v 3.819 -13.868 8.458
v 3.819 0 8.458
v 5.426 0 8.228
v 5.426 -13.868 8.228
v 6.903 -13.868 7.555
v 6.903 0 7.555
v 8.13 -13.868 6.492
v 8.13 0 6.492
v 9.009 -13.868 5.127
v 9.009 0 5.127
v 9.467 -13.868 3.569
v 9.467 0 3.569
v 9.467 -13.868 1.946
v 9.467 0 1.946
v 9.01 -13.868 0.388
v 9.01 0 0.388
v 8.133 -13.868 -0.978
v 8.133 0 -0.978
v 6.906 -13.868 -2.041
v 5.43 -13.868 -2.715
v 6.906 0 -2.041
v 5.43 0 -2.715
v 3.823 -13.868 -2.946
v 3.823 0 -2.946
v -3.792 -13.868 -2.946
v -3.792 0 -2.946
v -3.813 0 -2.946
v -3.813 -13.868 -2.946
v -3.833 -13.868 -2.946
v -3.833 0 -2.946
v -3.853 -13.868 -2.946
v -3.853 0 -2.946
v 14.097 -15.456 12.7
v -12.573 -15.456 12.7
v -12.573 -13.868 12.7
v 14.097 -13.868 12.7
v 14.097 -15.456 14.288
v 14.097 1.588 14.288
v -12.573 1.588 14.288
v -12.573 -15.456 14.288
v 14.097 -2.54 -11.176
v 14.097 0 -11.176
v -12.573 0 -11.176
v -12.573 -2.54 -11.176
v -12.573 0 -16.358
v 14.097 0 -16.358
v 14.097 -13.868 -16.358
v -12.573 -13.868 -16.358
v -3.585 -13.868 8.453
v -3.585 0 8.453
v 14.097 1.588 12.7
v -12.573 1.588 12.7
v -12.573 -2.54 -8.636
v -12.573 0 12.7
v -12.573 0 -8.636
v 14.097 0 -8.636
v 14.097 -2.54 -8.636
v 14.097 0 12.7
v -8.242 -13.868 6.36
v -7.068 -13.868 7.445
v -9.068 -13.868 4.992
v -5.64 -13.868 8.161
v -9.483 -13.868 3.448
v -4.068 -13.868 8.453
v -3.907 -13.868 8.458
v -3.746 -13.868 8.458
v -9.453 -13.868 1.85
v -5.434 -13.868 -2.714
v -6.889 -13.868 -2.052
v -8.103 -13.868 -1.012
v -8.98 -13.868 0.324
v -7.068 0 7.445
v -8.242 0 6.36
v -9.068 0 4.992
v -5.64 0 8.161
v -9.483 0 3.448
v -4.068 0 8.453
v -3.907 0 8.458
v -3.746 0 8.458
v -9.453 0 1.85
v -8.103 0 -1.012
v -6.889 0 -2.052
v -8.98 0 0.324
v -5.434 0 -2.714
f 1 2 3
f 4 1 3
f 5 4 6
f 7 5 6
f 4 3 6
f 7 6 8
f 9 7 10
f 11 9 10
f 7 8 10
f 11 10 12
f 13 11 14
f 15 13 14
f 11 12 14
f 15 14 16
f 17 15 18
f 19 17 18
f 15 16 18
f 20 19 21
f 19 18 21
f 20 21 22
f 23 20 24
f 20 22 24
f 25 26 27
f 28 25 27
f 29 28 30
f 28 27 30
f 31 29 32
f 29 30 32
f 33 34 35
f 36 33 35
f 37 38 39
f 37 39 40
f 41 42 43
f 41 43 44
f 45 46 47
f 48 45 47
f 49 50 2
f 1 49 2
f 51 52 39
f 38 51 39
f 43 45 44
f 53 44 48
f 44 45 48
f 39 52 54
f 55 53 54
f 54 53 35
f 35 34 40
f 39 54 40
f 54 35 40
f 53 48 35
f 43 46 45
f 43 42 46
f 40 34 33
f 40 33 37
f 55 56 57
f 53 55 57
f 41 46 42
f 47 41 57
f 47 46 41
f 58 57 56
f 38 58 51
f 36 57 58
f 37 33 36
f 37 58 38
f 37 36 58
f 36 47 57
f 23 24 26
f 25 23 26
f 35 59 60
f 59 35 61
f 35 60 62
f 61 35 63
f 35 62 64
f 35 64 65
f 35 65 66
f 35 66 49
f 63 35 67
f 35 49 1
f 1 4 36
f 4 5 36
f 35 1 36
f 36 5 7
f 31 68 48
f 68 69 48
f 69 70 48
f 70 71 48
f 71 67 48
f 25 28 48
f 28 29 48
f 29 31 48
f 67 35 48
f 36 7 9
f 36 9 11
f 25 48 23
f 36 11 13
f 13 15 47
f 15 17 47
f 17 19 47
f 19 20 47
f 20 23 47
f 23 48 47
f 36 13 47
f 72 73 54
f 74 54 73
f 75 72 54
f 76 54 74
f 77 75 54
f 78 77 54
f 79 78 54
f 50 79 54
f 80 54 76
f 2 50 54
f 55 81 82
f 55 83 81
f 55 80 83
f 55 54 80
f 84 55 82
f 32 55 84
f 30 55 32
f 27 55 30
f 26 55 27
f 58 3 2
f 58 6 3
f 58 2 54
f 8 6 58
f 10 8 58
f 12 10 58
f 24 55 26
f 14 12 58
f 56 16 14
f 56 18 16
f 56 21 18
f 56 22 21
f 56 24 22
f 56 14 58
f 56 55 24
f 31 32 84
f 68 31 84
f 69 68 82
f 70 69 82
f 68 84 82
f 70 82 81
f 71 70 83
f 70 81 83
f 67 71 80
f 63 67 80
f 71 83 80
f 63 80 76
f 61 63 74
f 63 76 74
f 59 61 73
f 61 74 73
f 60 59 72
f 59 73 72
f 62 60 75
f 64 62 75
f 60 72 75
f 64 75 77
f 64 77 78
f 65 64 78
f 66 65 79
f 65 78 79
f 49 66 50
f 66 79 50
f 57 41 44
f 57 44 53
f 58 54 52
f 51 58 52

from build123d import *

# Parameters (mm, degrees)
F0_W      = 25.4
F0_H      = 2.54
F0_H_2    = 1.524
F1_DEPTH  = 13.8684
F2_DEPTH  = 2.54
F3_DEPTH  = 1.397
F4_DEPTH  = 0.127
F5_DEPTH  = 3.6576
F6_W      = 13.97
F6_H      = 13.8684
F7_DEPTH  = 1.5875
F8_W      = 13.97
F8_H      = 1.5875
F9_DEPTH  = 1.5875
F10_W     = 13.97
F10_H     = 1.5875
F11_DEPTH = 1.5875
F12_DEPTH = 12.7


with BuildPart() as f1:
    # F0 (on Front) → F1 (new body)
    with BuildSketch(Plane.XZ):
        Polygon((12.7, 12.7), (-12.7, 12.7), (-12.7, -4.10832325), (-12.7, -8.636), (12.7, -8.636), align=None)
        with BuildLine():
            ThreePointArc((-4.0682750421, 8.452909583), (-3.8265239697, 8.4581987178), (-3.584766021, 8.4532338248))
            Line((-3.584766021, 8.4532338248), (3.8188760303, 8.4581987178))
            ThreePointArc((3.8188760303, 8.4581987178), (9.5249996895, 2.7577817272), (3.8226394845, -2.9463999997))
            Line((3.8226394845, -2.9463999997), (-3.7923413869, -2.9463191859))
            ThreePointArc((-3.7923413869, -2.9463191859), (-3.8227605155, -2.9463999997), (-3.8531796423, -2.9463185403))
            ThreePointArc((-3.8531796423, -2.9463185403), (-9.5239851182, 2.6483207685), (-4.0682750421, 8.452909583))
        make_face(mode=Mode.SUBTRACT)
        with Locations((0, -9.906)):
            Rectangle(F0_W, F0_H)
        with Locations((0, -11.938)):
            Rectangle(F0_W, F0_H_2)
    extrude(amount=F1_DEPTH)

    # F0 (on Front) → F2 (cut)
    with BuildSketch(Plane.XZ):
        with Locations((0, -9.906)):
            Rectangle(F0_W, F0_H)
    extrude(amount=F2_DEPTH, mode=Mode.SUBTRACT)

    # F3 (add): a face of the model
    f3_faces = [f1.faces().sort_by_distance(p)[0] for p in [
        (12.7, -7.0398753731, 0.1848134328),
    ]]
    extrude(f3_faces, amount=F3_DEPTH)

    # F4 (cut): a face of the model
    f4_faces = [f1.faces().sort_by_distance(p)[0] for p in [
        (-12.7, -7.0398753731, 0.1848134328),
    ]]
    extrude(f4_faces, amount=-F4_DEPTH, mode=Mode.SUBTRACT)

    # F5 (add): a face of the model
    f5_faces = [f1.faces().sort_by_distance(p)[0] for p in [
        (0.762, -6.9342, -12.7),
    ]]
    extrude(f5_faces, amount=F5_DEPTH)

    # F6 (on face) → F7 (join)
    with BuildSketch(Plane.XY.offset(12.7)):
        with Locations((7.112, -6.9342)):
            Rectangle(F6_W, F6_H)
    extrude(amount=F7_DEPTH)

    # F8 (on face) → F9 (join)
    with BuildSketch(Plane.XZ.offset(13.8684)):
        with Locations((7.112, 13.49375)):
            Rectangle(F8_W, F8_H)
    extrude(amount=F9_DEPTH)

    # F10 (on face) → F11 (join)
    with BuildSketch(Plane(origin=(0, 0, 0), x_dir=(-1, 0, 0), z_dir=(0, 1, 0))):
        with Locations((-7.112, 13.49375)):
            Rectangle(F10_W, F10_H)
    extrude(amount=F11_DEPTH)

    # F12 (add, through all): a face of the model
    f12_faces = [f1.faces().sort_by_distance(p)[0] for p in [
        (0.127, -6.9342, 13.49375),
    ]]
    extrude(f12_faces, amount=F12_DEPTH)


solid = f1.part
